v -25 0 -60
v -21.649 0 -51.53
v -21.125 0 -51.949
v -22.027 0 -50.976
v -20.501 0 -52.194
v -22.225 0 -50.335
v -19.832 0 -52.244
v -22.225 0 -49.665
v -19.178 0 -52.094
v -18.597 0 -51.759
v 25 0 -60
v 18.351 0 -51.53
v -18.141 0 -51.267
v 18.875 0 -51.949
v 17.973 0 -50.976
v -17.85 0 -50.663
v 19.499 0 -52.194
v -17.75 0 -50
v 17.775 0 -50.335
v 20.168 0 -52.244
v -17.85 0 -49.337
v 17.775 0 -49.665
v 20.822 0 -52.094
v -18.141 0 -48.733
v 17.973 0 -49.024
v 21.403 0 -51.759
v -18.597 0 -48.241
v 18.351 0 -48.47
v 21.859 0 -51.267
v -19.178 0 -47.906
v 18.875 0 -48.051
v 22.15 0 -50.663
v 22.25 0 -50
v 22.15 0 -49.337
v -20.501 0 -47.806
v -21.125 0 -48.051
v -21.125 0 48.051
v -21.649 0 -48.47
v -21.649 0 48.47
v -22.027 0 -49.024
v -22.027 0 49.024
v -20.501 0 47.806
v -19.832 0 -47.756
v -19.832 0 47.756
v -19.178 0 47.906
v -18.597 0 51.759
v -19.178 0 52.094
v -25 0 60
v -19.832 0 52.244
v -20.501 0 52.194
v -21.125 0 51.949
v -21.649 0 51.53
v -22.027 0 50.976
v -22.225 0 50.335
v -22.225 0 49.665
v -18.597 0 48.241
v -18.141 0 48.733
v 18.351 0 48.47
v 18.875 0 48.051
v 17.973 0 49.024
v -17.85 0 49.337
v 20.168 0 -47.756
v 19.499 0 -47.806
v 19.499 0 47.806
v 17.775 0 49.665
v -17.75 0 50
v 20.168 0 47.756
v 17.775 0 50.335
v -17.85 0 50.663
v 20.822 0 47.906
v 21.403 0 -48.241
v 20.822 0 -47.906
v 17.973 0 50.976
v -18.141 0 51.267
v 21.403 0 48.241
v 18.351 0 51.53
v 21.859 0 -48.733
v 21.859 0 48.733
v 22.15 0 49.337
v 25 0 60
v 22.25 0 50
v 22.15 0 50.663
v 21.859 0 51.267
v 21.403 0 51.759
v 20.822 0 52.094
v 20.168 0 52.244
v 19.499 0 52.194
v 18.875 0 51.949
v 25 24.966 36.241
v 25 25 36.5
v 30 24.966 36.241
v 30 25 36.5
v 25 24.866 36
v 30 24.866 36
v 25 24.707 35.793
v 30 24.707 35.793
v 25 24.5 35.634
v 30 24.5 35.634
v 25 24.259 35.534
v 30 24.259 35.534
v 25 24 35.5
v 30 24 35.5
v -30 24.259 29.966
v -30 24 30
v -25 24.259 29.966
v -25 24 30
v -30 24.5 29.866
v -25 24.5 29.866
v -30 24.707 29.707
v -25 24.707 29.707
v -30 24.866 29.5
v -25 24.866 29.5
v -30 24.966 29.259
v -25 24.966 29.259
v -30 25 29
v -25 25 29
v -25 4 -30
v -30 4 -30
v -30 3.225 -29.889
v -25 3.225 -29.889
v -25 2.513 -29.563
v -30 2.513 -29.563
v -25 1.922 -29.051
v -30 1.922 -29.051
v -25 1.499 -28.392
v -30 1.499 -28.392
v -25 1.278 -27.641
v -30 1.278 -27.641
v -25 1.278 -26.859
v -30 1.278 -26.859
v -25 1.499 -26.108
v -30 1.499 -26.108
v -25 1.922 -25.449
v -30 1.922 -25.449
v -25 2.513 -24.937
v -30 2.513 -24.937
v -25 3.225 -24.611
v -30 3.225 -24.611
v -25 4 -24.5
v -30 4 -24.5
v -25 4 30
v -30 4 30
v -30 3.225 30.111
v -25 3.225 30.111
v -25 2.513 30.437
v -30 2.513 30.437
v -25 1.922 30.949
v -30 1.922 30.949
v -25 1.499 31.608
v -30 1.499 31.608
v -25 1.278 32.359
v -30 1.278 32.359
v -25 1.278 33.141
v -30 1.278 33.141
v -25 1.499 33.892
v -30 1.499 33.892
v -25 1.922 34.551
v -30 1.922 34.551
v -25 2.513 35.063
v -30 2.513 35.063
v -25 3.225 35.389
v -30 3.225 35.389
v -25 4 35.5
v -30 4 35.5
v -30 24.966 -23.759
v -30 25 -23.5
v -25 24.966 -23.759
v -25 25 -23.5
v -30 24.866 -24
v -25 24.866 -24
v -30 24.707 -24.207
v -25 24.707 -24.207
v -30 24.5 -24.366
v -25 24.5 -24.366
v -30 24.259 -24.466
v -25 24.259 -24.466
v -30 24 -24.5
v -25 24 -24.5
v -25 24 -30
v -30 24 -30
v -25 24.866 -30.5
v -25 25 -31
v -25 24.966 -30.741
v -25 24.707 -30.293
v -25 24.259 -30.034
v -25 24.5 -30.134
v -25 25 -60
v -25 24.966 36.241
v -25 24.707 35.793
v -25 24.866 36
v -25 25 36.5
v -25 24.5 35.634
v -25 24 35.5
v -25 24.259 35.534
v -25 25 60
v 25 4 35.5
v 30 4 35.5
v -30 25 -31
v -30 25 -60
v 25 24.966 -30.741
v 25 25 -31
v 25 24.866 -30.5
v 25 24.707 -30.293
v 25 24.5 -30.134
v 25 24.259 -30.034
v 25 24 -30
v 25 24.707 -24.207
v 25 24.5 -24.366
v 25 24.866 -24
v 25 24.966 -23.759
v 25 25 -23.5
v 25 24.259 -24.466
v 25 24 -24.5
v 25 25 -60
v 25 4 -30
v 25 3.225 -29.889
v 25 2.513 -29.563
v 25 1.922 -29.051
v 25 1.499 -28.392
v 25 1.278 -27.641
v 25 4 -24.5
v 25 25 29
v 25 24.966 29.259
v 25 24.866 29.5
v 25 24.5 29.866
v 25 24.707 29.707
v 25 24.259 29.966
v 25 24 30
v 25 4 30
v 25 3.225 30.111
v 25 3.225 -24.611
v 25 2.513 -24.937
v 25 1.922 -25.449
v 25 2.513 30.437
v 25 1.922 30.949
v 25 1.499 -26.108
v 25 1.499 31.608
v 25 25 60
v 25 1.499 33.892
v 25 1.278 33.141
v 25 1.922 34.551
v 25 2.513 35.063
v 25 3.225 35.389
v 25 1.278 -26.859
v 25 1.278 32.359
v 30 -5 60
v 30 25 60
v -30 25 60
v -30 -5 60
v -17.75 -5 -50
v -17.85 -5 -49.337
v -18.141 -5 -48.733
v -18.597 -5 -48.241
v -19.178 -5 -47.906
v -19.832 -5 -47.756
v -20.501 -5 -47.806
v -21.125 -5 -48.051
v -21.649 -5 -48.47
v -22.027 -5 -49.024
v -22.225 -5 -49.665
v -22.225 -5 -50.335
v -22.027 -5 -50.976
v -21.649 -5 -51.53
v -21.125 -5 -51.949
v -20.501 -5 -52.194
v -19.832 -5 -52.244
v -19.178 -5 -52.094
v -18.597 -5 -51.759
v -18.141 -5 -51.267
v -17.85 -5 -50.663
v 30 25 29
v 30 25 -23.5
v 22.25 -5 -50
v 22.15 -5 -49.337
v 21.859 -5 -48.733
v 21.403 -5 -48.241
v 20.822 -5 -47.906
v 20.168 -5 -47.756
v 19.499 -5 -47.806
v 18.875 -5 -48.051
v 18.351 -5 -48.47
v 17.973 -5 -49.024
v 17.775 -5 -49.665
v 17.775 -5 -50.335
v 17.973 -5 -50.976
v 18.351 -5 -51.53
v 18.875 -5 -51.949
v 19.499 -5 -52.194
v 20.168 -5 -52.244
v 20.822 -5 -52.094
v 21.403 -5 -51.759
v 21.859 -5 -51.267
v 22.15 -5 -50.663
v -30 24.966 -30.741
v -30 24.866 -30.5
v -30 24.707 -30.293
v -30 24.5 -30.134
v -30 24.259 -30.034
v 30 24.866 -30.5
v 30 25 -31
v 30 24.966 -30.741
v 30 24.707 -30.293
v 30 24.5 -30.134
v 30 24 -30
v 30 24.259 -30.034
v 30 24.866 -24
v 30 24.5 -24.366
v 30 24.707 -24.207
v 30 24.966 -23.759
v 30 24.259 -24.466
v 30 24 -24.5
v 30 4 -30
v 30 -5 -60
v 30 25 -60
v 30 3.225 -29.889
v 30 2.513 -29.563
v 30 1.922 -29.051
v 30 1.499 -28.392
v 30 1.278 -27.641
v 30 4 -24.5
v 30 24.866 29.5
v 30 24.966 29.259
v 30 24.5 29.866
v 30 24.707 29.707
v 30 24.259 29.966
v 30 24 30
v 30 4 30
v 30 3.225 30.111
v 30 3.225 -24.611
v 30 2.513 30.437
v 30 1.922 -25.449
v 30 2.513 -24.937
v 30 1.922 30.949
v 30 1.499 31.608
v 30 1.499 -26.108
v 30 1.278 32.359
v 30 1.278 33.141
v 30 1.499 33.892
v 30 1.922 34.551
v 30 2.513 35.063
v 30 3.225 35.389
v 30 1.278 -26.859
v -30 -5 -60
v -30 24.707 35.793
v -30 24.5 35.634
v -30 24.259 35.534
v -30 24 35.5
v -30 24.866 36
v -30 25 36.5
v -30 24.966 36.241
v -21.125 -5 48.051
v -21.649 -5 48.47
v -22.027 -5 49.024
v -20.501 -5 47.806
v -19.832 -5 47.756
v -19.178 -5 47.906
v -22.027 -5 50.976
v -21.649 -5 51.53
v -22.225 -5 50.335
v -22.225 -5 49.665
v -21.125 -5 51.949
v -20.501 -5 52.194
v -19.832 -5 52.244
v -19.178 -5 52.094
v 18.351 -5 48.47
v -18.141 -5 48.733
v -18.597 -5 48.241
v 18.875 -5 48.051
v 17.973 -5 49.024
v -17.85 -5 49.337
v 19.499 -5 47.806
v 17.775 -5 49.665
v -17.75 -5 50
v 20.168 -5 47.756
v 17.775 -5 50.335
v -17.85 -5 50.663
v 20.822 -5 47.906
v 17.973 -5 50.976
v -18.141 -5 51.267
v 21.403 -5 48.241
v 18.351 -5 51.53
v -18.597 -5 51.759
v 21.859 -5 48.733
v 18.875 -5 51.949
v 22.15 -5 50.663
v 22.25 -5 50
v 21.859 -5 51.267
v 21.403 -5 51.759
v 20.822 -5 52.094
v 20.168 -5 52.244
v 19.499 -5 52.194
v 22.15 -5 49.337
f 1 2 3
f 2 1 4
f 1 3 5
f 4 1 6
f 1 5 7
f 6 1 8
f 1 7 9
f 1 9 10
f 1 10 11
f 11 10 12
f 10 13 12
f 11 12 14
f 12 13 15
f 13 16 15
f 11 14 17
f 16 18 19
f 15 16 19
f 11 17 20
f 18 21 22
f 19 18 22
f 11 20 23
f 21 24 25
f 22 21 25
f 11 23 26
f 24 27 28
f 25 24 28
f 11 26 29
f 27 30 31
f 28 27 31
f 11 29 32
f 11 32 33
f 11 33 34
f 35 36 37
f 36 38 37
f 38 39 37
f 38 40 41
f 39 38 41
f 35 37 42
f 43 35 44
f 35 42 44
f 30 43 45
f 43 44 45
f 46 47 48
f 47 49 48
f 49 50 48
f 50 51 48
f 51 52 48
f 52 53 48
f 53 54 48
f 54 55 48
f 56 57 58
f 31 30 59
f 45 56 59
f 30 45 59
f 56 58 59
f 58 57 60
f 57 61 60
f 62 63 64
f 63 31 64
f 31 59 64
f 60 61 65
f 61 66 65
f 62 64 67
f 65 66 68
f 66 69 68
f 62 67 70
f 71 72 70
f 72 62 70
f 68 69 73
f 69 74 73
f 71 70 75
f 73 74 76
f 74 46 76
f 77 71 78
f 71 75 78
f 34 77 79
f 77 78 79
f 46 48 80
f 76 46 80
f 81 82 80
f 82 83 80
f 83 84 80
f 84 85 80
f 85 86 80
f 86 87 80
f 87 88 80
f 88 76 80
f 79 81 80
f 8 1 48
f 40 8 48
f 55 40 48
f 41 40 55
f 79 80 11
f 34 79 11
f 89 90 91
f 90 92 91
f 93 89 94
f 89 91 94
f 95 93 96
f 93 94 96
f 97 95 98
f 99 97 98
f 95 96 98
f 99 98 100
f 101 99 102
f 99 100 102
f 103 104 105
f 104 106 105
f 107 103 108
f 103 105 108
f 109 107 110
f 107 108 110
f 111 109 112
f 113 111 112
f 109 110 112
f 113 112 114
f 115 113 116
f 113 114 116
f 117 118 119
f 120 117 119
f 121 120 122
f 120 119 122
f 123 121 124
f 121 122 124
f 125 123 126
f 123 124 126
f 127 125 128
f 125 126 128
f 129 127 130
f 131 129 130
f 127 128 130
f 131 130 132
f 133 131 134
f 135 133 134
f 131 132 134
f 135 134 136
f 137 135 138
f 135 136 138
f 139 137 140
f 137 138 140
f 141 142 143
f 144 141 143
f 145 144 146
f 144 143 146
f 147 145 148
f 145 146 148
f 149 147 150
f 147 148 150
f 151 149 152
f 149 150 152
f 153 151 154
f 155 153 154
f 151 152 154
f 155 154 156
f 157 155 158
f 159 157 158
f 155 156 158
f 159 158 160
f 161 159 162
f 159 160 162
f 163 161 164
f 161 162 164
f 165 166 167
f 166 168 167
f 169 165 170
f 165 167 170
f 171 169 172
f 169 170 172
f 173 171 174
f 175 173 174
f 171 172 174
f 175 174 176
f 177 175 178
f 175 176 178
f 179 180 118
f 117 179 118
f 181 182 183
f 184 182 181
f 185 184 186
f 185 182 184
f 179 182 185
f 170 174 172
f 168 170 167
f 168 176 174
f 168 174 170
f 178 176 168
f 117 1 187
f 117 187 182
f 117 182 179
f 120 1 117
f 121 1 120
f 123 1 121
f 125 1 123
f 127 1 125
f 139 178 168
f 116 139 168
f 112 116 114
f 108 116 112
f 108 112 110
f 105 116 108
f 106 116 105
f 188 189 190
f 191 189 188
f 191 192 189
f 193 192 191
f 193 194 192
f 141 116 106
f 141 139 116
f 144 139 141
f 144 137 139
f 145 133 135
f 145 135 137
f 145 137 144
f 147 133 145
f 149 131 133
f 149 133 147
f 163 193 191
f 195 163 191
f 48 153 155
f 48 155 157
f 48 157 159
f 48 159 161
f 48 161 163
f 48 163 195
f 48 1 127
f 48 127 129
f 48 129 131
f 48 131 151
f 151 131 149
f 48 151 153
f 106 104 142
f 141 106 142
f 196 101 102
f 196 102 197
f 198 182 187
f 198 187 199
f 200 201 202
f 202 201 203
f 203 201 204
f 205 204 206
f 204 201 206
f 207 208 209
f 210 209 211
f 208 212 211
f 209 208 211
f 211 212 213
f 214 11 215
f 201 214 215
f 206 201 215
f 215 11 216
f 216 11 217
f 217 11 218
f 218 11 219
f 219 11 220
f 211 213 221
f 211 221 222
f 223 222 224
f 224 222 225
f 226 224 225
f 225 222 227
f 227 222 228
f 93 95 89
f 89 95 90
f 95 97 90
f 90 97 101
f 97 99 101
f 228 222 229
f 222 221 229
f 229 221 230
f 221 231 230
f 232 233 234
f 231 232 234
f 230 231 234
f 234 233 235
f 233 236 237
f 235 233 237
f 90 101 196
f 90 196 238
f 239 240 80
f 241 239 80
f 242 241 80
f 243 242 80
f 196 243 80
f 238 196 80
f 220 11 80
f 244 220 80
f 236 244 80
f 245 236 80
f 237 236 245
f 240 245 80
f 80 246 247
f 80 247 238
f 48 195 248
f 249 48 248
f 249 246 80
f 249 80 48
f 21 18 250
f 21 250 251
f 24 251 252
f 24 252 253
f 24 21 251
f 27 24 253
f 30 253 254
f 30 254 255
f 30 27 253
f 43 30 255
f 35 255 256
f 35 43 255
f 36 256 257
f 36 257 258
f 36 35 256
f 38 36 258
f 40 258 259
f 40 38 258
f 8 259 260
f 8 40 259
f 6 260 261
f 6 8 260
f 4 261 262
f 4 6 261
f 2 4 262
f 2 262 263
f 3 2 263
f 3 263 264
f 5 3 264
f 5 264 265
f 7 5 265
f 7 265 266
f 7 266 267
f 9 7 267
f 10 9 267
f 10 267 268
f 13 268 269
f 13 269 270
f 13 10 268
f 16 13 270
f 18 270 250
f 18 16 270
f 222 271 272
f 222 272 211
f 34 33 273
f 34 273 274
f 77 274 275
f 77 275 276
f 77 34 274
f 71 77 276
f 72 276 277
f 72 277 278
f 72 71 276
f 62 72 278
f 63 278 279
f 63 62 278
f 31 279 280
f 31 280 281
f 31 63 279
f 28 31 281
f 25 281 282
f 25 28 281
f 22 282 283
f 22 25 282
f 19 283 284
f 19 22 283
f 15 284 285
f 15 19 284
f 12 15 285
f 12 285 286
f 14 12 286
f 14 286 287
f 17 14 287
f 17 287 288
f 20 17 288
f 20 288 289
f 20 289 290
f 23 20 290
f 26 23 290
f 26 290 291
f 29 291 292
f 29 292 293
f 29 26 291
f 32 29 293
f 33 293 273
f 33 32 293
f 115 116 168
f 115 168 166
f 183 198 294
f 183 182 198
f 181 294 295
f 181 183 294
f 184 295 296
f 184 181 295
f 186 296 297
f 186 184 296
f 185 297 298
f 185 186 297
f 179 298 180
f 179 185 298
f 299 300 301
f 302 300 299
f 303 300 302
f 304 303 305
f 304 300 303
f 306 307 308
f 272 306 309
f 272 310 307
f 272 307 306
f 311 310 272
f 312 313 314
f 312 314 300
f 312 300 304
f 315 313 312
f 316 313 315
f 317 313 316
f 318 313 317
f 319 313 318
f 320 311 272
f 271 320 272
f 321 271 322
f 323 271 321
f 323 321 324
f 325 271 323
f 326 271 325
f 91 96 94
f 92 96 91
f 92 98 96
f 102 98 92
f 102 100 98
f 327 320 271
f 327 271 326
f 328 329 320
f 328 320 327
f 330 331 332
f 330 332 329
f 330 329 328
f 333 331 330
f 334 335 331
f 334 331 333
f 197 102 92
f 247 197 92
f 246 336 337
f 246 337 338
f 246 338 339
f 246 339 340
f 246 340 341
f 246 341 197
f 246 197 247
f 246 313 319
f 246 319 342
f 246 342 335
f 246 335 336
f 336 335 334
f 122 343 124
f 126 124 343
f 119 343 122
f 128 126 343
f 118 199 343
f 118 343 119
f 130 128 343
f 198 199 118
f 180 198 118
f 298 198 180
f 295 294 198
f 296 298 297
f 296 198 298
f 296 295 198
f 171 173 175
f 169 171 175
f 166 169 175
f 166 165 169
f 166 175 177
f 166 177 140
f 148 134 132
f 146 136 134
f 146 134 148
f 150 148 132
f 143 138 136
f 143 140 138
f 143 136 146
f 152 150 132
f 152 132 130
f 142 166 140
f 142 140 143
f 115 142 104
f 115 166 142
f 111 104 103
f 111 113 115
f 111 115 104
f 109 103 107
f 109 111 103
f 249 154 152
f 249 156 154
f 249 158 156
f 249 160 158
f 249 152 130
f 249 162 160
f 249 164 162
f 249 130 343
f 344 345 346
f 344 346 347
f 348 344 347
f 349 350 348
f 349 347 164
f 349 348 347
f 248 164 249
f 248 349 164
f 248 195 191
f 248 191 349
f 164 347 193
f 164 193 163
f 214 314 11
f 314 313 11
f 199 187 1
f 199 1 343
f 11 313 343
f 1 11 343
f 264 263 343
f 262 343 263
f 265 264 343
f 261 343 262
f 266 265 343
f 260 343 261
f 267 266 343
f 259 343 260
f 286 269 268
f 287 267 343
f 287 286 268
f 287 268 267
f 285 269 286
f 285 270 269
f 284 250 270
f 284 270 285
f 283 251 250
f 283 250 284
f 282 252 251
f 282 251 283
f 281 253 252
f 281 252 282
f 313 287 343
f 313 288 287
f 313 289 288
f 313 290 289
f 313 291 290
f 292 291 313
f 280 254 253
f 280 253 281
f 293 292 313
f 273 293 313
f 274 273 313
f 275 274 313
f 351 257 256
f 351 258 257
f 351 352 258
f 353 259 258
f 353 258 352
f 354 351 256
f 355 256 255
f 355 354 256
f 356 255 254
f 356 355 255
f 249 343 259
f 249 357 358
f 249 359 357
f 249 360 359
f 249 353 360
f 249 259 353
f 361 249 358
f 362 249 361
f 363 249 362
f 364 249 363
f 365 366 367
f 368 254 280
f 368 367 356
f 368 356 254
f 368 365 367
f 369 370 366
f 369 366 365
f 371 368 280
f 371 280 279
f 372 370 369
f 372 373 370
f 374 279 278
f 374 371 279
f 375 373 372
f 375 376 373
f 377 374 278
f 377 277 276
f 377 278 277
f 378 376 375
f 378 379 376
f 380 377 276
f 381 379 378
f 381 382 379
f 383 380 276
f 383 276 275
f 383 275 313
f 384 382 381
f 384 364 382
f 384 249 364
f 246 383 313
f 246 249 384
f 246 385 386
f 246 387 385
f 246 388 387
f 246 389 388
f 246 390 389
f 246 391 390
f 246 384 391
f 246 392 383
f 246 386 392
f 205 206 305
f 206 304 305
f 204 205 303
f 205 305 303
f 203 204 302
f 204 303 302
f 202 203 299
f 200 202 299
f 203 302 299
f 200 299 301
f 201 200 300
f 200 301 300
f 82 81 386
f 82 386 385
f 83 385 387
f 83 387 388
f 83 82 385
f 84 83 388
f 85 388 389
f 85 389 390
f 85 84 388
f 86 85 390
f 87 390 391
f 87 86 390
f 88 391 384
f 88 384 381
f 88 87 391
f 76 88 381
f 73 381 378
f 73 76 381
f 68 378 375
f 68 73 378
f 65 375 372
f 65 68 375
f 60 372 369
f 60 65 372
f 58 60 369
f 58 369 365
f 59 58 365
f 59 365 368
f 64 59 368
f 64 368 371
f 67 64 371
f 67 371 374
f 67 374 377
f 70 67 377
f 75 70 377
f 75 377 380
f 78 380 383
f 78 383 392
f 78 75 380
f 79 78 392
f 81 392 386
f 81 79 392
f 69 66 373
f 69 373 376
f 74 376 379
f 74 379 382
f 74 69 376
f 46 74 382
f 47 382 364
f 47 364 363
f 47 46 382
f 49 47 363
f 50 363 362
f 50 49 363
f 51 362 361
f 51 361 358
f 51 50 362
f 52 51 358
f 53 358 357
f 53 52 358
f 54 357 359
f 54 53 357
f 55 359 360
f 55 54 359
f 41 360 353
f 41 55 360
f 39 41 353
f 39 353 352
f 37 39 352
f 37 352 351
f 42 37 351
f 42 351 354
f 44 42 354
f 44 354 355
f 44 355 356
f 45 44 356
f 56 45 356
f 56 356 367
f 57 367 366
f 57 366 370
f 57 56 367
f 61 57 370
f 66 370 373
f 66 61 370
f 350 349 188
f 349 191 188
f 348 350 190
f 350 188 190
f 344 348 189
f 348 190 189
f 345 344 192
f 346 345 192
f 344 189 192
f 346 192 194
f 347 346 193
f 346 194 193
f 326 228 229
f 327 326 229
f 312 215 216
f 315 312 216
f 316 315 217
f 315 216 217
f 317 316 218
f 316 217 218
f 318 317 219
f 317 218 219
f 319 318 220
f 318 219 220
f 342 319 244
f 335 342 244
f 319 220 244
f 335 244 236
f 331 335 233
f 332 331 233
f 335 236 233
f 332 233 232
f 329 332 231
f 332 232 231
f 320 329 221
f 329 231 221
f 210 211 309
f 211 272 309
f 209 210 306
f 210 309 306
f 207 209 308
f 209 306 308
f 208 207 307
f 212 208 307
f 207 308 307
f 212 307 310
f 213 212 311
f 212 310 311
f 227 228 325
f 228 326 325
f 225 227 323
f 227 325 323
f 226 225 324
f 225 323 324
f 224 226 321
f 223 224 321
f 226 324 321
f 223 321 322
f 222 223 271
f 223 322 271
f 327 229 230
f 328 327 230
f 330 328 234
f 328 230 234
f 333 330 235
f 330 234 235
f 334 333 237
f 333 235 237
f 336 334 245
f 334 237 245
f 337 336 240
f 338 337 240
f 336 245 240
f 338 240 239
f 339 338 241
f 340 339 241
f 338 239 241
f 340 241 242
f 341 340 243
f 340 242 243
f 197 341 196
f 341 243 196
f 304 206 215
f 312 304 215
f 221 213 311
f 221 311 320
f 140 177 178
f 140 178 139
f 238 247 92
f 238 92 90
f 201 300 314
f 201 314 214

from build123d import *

# Parameters (mm, degrees)
F0_W     = 60
F0_H     = 120
F0_R     = 2.25
F1_DEPTH = 5
F2_W     = 5
F2_H     = 120
F3_DEPTH = 25
F4_W     = 21
F4_H     = 5.5
F5_DEPTH = 72
F6_R     = 1


with BuildPart() as f1:
    # F0 (on Front) → F1 (new body)
    with BuildSketch(Plane.XZ):
        Rectangle(F0_W, F0_H)
        with Locations((-20, -50)):
            Circle(F0_R, mode=Mode.SUBTRACT)
        with Locations((20, -50)):
            Circle(F0_R, mode=Mode.SUBTRACT)
        with Locations((-20, 50)):
            Circle(F0_R, mode=Mode.SUBTRACT)
        with Locations((20, 50)):
            Circle(F0_R, mode=Mode.SUBTRACT)
    extrude(amount=F1_DEPTH)

    # F2 (on face) → F3 (join)
    with BuildSketch(Plane(origin=(0, 0, 0), x_dir=(-1, 0, 0), z_dir=(0, 1, 0))):
        with Locations((-27.5, 0)):
            Rectangle(F2_W, F2_H)
        with Locations((27.5, 0)):
            Rectangle(F2_W, F2_H)
    extrude(amount=F3_DEPTH)

    # F4 (on face) → F5 (cut)
    with BuildSketch(Plane(origin=(-30, 0, 0), x_dir=(0, -1, 0), z_dir=(-1, 0, 0))):
        with Locations((-14.5, 32.75)):
            Rectangle(F4_W, F4_H)
        with BuildLine():
            ThreePointArc((-4, 30), (-1.25, 32.75), (-4, 35.5))
            Line((-4, 35.5), (-4, 30))
        make_face()
        with Locations((-14.5, -27.25)):
            Rectangle(F4_W, F4_H)
        with BuildLine():
            ThreePointArc((-4, -30), (-1.25, -27.25), (-4, -24.5))
            Line((-4, -24.5), (-4, -30))
        make_face()
    extrude(amount=-F5_DEPTH, mode=Mode.SUBTRACT)

    # F6
    f6_edges = [f1.edges().sort_by_distance(p)[0] for p in [
        (-27.5, 25, 35.5),
        (27.5, 25, 30),
        (27.5, 25, 35.5),
        (-27.5, 25, 30),
        (27.5, 25, -24.5),
        (-27.5, 25, -24.5),
        (-27.5, 25, -30),
        (27.5, 25, -30),
    ]]
    fillet(f6_edges, radius=F6_R)


solid = f1.part
